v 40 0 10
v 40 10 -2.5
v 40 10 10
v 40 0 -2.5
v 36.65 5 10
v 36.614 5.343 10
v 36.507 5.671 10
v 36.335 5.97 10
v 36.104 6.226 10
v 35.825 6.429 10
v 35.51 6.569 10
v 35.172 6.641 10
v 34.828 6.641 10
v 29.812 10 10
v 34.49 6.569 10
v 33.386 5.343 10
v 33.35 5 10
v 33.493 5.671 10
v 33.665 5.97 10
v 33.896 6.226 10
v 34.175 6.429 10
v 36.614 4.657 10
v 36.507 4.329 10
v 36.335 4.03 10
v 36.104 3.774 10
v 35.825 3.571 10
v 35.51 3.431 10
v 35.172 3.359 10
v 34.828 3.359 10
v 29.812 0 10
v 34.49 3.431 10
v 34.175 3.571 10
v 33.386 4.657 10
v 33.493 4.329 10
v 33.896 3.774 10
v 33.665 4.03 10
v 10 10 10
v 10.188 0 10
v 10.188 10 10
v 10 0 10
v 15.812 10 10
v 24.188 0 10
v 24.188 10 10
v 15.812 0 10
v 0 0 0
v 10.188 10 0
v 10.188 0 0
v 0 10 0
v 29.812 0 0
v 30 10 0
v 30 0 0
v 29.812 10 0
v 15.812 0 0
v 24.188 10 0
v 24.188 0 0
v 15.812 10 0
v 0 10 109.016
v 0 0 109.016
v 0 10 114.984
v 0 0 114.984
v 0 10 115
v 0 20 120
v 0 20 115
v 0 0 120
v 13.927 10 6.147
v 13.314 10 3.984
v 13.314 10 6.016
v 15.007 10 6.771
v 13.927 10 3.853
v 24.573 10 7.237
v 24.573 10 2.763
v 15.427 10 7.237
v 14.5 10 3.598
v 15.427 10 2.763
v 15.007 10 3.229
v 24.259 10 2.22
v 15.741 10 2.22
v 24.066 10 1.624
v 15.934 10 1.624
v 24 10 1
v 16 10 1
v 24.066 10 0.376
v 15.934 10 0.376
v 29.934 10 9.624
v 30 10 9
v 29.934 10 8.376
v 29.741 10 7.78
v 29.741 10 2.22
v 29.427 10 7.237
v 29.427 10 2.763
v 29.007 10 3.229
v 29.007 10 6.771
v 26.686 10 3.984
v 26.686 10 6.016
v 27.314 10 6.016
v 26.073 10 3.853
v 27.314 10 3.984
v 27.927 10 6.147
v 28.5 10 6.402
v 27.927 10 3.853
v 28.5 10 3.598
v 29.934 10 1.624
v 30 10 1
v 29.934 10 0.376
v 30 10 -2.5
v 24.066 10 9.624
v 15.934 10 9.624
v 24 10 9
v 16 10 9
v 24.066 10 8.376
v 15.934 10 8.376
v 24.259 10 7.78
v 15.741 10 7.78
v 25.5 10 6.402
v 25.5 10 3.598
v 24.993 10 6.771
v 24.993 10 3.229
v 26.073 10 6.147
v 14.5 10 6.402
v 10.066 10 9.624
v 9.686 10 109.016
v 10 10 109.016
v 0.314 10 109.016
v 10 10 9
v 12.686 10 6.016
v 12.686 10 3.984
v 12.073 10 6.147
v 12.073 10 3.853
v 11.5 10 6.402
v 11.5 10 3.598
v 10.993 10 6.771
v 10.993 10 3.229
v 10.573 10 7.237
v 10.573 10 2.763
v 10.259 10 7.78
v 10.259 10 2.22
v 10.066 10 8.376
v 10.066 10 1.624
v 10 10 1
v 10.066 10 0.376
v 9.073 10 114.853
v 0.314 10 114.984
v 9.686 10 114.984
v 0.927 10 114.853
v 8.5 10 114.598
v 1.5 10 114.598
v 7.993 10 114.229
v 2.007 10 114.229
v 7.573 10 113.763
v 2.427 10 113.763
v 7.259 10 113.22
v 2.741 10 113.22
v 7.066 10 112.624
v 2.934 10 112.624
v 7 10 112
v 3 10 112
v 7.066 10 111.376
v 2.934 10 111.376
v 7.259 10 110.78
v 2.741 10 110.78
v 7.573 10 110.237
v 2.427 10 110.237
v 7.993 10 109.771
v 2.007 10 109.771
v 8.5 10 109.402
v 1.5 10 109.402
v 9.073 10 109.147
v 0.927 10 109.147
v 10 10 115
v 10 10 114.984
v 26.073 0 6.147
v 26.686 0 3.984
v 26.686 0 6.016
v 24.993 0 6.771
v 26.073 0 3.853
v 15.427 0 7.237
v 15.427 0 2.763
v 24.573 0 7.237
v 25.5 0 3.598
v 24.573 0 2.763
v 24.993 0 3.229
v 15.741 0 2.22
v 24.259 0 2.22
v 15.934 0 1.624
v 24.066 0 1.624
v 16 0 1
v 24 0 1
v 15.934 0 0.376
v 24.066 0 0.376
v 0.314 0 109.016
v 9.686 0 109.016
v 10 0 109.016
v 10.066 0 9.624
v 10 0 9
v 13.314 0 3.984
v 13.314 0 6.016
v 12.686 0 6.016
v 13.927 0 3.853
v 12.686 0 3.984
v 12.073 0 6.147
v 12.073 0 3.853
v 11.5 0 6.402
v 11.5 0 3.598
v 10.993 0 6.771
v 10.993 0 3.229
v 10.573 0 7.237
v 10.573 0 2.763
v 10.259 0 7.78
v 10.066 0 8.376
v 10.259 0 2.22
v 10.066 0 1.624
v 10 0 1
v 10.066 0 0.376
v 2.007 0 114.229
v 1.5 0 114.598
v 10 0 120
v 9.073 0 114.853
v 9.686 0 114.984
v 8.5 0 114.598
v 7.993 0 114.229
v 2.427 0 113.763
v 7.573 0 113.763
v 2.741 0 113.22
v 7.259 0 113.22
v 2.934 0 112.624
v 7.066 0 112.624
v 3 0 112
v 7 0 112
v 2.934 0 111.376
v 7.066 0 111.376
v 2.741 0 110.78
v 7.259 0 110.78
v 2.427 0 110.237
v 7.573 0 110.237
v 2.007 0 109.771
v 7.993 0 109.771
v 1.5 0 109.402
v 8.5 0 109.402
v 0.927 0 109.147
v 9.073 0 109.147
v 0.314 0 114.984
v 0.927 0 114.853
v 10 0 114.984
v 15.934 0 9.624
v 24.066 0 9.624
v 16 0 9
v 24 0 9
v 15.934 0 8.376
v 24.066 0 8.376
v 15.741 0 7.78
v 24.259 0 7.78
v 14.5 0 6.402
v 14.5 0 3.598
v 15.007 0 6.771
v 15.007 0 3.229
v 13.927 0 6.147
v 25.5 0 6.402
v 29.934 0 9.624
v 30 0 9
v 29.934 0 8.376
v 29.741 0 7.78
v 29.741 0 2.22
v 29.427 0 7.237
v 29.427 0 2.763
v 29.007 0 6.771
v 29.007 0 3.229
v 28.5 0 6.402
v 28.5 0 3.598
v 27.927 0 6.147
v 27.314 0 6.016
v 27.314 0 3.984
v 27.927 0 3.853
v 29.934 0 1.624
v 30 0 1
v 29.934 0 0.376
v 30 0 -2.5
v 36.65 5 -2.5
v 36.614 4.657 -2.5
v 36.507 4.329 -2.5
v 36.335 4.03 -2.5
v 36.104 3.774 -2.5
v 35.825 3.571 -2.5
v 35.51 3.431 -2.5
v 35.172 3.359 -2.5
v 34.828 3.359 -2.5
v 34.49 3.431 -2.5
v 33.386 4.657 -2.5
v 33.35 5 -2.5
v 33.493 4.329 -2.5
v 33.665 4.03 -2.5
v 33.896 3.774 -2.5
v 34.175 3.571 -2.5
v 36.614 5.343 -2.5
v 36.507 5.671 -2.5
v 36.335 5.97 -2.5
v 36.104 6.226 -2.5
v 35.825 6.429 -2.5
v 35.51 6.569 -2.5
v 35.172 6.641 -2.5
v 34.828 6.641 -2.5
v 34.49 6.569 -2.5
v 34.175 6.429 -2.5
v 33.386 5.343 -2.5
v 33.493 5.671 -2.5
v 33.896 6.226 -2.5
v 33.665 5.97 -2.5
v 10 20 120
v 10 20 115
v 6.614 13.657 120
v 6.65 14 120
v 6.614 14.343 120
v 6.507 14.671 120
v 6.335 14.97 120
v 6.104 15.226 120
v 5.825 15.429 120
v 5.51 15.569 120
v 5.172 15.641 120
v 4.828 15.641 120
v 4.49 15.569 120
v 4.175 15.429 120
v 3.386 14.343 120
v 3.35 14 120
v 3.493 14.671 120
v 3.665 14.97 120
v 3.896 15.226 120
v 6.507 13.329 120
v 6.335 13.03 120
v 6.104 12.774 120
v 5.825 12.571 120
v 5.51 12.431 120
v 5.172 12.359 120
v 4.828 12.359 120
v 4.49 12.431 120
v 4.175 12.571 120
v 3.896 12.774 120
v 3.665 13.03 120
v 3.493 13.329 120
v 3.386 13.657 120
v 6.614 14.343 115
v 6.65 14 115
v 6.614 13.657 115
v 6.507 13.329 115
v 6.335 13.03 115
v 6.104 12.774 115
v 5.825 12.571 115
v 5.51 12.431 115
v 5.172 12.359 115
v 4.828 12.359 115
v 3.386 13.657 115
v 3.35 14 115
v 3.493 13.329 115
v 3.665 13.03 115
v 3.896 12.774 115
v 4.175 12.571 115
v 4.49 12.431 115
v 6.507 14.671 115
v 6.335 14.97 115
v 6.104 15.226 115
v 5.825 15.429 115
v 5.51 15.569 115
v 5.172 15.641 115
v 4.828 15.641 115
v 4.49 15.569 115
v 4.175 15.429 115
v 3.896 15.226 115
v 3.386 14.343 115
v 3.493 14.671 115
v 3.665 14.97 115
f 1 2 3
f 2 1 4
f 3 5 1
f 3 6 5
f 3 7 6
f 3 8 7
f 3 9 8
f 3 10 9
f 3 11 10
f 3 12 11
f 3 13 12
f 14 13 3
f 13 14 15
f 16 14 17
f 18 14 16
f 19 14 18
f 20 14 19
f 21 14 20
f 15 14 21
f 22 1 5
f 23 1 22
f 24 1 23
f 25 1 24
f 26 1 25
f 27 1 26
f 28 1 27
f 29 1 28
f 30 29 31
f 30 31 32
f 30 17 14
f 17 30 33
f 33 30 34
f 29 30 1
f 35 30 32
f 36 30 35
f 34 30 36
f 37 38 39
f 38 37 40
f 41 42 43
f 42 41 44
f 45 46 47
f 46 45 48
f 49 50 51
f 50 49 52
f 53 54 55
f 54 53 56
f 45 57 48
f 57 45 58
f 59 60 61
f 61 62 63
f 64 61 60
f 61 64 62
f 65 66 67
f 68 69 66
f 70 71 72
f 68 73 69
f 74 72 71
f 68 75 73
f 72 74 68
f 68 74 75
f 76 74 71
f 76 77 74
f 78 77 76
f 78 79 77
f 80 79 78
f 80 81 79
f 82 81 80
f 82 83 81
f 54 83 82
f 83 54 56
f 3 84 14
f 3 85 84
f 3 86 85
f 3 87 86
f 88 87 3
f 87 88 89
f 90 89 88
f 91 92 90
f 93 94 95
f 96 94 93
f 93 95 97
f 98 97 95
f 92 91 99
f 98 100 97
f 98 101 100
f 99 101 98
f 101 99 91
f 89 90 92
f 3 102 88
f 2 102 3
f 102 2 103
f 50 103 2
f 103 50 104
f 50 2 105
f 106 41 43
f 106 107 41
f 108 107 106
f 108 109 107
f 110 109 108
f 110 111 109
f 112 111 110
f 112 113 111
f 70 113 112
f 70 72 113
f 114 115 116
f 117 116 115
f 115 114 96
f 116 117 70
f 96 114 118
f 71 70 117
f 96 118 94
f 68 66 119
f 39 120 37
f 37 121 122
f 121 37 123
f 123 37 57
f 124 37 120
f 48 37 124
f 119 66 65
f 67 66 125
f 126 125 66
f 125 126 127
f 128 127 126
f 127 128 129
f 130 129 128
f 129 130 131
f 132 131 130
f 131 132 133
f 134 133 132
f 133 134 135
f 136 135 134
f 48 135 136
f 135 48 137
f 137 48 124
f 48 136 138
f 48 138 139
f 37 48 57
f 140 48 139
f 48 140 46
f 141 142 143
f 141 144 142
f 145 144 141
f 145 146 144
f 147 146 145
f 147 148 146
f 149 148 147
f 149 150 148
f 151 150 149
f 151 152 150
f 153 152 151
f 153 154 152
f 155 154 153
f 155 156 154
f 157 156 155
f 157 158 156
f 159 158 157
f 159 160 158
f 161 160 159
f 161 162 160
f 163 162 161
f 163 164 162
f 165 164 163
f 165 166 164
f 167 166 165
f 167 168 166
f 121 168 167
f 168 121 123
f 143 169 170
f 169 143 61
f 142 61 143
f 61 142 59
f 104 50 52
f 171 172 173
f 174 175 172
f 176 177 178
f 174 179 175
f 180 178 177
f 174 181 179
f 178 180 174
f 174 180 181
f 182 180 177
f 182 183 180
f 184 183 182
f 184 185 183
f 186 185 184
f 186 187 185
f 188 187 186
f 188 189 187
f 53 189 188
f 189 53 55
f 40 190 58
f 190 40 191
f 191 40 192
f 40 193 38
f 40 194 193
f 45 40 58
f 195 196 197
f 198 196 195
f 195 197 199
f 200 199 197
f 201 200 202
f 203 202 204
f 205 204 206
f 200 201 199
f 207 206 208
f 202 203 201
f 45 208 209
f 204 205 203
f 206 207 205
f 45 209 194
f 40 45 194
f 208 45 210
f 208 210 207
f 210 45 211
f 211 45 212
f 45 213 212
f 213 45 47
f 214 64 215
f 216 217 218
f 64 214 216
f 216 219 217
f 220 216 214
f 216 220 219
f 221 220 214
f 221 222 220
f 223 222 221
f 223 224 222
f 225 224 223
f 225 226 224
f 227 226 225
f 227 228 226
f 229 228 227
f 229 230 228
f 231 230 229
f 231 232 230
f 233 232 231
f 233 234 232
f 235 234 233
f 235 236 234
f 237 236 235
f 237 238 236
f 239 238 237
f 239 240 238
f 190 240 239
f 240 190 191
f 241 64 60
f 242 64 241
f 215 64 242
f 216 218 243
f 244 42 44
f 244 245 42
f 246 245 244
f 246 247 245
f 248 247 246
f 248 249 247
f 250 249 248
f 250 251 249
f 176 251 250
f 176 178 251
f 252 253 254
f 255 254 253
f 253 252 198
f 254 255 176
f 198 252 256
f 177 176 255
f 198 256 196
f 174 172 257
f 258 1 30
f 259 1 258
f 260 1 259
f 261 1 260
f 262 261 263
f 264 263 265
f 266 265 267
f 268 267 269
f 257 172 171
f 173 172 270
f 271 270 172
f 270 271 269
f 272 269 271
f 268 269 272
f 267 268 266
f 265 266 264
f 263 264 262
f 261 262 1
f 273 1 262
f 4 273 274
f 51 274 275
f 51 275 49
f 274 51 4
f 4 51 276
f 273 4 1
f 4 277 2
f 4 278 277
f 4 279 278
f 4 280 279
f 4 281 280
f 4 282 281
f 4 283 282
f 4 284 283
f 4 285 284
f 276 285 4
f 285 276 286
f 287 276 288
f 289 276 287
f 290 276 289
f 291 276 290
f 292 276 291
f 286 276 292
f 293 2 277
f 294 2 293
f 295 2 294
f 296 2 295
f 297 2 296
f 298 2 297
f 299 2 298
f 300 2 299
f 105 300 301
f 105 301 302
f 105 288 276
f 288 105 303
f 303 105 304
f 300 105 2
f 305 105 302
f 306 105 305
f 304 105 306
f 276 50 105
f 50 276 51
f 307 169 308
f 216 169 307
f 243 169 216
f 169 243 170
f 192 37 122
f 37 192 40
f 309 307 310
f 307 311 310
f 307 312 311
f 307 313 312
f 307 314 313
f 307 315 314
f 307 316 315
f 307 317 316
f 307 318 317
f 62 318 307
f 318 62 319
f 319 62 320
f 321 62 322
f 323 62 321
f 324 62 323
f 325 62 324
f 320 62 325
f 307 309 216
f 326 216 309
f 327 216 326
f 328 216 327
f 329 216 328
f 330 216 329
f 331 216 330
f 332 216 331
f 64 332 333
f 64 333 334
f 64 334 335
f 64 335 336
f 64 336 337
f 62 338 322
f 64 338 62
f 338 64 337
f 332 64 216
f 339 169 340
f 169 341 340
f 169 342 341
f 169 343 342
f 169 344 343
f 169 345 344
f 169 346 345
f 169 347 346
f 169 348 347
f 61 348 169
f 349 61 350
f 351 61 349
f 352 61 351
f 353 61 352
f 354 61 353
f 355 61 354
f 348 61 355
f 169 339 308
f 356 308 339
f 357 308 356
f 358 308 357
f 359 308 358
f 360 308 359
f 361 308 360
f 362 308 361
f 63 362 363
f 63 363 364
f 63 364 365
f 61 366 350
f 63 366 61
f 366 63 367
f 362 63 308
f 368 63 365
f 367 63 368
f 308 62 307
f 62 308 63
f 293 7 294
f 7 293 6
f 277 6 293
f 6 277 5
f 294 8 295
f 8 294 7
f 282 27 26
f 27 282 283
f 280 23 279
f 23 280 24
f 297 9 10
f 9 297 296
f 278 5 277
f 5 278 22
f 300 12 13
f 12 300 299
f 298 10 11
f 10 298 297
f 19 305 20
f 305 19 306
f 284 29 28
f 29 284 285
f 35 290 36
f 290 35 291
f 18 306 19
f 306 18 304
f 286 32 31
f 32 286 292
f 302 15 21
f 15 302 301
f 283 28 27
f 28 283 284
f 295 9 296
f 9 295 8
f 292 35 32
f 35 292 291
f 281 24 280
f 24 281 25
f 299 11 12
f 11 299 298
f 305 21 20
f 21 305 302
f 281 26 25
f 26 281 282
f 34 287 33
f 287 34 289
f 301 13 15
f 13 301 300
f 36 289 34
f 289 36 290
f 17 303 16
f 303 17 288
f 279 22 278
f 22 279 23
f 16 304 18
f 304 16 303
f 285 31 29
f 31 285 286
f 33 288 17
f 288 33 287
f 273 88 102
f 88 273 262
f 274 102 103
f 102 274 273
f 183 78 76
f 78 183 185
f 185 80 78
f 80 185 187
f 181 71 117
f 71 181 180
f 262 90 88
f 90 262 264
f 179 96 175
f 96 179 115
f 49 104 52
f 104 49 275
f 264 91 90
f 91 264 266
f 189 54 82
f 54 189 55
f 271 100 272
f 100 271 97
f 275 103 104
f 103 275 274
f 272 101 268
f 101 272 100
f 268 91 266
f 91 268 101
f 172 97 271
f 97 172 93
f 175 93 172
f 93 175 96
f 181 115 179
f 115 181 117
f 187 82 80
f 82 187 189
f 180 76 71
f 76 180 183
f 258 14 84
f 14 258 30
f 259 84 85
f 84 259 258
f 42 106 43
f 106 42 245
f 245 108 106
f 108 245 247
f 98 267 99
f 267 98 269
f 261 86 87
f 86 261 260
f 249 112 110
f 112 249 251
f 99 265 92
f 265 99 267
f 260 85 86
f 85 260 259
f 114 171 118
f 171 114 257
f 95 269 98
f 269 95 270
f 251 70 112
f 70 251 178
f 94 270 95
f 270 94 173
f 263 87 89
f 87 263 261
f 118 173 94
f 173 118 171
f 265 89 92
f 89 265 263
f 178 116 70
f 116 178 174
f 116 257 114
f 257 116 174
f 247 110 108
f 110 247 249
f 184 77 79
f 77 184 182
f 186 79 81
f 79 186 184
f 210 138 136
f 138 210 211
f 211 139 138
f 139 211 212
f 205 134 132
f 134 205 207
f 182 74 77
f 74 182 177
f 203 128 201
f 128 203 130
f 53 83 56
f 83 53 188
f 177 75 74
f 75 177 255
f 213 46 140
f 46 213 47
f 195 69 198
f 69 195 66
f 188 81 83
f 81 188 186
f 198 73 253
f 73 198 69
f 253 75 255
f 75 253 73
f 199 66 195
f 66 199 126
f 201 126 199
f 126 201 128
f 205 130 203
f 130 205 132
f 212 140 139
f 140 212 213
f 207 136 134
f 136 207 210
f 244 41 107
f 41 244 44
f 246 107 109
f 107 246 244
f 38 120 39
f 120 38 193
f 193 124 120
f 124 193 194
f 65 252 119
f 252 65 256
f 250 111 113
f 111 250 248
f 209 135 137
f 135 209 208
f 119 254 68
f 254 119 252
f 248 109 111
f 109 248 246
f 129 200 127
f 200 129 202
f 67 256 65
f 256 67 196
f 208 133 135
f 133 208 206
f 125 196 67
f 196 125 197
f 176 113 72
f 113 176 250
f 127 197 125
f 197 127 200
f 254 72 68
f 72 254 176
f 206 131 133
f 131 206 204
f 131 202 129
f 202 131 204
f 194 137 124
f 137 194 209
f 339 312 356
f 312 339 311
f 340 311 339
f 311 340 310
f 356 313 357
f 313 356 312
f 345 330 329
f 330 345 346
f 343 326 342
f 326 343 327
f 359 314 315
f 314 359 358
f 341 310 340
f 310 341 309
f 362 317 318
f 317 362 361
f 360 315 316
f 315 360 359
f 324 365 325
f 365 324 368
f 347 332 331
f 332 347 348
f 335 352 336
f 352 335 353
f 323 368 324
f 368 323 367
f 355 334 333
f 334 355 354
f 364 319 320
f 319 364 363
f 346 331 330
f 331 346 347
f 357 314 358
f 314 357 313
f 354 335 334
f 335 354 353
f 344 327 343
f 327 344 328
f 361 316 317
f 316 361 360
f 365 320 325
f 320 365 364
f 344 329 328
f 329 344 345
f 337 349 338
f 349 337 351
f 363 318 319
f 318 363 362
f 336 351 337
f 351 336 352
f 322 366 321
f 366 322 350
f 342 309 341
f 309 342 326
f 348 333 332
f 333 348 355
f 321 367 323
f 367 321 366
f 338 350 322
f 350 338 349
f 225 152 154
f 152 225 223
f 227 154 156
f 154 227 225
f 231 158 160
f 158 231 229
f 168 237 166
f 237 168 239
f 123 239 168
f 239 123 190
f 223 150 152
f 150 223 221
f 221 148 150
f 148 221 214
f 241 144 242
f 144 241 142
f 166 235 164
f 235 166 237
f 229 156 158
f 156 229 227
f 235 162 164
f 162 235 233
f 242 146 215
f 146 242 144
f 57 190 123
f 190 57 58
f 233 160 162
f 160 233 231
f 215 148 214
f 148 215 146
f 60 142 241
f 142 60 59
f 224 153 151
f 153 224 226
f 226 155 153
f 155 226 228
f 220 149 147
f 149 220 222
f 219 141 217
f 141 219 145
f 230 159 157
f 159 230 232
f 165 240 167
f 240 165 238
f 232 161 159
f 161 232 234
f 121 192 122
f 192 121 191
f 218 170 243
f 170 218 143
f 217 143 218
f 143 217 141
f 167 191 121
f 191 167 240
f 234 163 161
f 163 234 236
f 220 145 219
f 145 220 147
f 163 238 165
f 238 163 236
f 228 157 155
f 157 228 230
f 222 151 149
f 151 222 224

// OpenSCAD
$fn=30;
legth=40;
width=10;
height=10;
difference(){
    union(){
        cube([legth,width,height]);
        translate([35,width/2,0])cube([legth-30,width,height/2],center=true);
        cube([legth-30,width,height*12]);
        translate([5,15,117.5])cube([legth-30,height,height/2],center=true);
    }
    translate([35,width/2,-30])cylinder(r=1.5*1.1,h=height*10,center=true);
    //translate([35,width/2,8.5])cylinder(r=2.5*1.1,h=1.5,center=true);
    rotate([90,0,0])translate([27,1,0])cylinder(r=3,h=height*10,center=true);
    rotate([90,0,0])translate([27,9,0])cylinder(r=3,h=height*10,center=true);
    rotate([90,0,0])translate([13,1,0])cylinder(r=3,h=height*10,center=true);
    rotate([90,0,0])translate([13,9,0])cylinder(r=3,h=height*10,center=true);
    translate([5,width+4,100])cylinder(r=1.5*1.1,h=height*10,center=true);
    rotate([90,0,0])translate([0,112,0,])cylinder(r=3,h=height*10,center=true);
    rotate([90,0,0])translate([10,112,0,])cylinder(r=3,h=height*10,center=true);
}
   
       
